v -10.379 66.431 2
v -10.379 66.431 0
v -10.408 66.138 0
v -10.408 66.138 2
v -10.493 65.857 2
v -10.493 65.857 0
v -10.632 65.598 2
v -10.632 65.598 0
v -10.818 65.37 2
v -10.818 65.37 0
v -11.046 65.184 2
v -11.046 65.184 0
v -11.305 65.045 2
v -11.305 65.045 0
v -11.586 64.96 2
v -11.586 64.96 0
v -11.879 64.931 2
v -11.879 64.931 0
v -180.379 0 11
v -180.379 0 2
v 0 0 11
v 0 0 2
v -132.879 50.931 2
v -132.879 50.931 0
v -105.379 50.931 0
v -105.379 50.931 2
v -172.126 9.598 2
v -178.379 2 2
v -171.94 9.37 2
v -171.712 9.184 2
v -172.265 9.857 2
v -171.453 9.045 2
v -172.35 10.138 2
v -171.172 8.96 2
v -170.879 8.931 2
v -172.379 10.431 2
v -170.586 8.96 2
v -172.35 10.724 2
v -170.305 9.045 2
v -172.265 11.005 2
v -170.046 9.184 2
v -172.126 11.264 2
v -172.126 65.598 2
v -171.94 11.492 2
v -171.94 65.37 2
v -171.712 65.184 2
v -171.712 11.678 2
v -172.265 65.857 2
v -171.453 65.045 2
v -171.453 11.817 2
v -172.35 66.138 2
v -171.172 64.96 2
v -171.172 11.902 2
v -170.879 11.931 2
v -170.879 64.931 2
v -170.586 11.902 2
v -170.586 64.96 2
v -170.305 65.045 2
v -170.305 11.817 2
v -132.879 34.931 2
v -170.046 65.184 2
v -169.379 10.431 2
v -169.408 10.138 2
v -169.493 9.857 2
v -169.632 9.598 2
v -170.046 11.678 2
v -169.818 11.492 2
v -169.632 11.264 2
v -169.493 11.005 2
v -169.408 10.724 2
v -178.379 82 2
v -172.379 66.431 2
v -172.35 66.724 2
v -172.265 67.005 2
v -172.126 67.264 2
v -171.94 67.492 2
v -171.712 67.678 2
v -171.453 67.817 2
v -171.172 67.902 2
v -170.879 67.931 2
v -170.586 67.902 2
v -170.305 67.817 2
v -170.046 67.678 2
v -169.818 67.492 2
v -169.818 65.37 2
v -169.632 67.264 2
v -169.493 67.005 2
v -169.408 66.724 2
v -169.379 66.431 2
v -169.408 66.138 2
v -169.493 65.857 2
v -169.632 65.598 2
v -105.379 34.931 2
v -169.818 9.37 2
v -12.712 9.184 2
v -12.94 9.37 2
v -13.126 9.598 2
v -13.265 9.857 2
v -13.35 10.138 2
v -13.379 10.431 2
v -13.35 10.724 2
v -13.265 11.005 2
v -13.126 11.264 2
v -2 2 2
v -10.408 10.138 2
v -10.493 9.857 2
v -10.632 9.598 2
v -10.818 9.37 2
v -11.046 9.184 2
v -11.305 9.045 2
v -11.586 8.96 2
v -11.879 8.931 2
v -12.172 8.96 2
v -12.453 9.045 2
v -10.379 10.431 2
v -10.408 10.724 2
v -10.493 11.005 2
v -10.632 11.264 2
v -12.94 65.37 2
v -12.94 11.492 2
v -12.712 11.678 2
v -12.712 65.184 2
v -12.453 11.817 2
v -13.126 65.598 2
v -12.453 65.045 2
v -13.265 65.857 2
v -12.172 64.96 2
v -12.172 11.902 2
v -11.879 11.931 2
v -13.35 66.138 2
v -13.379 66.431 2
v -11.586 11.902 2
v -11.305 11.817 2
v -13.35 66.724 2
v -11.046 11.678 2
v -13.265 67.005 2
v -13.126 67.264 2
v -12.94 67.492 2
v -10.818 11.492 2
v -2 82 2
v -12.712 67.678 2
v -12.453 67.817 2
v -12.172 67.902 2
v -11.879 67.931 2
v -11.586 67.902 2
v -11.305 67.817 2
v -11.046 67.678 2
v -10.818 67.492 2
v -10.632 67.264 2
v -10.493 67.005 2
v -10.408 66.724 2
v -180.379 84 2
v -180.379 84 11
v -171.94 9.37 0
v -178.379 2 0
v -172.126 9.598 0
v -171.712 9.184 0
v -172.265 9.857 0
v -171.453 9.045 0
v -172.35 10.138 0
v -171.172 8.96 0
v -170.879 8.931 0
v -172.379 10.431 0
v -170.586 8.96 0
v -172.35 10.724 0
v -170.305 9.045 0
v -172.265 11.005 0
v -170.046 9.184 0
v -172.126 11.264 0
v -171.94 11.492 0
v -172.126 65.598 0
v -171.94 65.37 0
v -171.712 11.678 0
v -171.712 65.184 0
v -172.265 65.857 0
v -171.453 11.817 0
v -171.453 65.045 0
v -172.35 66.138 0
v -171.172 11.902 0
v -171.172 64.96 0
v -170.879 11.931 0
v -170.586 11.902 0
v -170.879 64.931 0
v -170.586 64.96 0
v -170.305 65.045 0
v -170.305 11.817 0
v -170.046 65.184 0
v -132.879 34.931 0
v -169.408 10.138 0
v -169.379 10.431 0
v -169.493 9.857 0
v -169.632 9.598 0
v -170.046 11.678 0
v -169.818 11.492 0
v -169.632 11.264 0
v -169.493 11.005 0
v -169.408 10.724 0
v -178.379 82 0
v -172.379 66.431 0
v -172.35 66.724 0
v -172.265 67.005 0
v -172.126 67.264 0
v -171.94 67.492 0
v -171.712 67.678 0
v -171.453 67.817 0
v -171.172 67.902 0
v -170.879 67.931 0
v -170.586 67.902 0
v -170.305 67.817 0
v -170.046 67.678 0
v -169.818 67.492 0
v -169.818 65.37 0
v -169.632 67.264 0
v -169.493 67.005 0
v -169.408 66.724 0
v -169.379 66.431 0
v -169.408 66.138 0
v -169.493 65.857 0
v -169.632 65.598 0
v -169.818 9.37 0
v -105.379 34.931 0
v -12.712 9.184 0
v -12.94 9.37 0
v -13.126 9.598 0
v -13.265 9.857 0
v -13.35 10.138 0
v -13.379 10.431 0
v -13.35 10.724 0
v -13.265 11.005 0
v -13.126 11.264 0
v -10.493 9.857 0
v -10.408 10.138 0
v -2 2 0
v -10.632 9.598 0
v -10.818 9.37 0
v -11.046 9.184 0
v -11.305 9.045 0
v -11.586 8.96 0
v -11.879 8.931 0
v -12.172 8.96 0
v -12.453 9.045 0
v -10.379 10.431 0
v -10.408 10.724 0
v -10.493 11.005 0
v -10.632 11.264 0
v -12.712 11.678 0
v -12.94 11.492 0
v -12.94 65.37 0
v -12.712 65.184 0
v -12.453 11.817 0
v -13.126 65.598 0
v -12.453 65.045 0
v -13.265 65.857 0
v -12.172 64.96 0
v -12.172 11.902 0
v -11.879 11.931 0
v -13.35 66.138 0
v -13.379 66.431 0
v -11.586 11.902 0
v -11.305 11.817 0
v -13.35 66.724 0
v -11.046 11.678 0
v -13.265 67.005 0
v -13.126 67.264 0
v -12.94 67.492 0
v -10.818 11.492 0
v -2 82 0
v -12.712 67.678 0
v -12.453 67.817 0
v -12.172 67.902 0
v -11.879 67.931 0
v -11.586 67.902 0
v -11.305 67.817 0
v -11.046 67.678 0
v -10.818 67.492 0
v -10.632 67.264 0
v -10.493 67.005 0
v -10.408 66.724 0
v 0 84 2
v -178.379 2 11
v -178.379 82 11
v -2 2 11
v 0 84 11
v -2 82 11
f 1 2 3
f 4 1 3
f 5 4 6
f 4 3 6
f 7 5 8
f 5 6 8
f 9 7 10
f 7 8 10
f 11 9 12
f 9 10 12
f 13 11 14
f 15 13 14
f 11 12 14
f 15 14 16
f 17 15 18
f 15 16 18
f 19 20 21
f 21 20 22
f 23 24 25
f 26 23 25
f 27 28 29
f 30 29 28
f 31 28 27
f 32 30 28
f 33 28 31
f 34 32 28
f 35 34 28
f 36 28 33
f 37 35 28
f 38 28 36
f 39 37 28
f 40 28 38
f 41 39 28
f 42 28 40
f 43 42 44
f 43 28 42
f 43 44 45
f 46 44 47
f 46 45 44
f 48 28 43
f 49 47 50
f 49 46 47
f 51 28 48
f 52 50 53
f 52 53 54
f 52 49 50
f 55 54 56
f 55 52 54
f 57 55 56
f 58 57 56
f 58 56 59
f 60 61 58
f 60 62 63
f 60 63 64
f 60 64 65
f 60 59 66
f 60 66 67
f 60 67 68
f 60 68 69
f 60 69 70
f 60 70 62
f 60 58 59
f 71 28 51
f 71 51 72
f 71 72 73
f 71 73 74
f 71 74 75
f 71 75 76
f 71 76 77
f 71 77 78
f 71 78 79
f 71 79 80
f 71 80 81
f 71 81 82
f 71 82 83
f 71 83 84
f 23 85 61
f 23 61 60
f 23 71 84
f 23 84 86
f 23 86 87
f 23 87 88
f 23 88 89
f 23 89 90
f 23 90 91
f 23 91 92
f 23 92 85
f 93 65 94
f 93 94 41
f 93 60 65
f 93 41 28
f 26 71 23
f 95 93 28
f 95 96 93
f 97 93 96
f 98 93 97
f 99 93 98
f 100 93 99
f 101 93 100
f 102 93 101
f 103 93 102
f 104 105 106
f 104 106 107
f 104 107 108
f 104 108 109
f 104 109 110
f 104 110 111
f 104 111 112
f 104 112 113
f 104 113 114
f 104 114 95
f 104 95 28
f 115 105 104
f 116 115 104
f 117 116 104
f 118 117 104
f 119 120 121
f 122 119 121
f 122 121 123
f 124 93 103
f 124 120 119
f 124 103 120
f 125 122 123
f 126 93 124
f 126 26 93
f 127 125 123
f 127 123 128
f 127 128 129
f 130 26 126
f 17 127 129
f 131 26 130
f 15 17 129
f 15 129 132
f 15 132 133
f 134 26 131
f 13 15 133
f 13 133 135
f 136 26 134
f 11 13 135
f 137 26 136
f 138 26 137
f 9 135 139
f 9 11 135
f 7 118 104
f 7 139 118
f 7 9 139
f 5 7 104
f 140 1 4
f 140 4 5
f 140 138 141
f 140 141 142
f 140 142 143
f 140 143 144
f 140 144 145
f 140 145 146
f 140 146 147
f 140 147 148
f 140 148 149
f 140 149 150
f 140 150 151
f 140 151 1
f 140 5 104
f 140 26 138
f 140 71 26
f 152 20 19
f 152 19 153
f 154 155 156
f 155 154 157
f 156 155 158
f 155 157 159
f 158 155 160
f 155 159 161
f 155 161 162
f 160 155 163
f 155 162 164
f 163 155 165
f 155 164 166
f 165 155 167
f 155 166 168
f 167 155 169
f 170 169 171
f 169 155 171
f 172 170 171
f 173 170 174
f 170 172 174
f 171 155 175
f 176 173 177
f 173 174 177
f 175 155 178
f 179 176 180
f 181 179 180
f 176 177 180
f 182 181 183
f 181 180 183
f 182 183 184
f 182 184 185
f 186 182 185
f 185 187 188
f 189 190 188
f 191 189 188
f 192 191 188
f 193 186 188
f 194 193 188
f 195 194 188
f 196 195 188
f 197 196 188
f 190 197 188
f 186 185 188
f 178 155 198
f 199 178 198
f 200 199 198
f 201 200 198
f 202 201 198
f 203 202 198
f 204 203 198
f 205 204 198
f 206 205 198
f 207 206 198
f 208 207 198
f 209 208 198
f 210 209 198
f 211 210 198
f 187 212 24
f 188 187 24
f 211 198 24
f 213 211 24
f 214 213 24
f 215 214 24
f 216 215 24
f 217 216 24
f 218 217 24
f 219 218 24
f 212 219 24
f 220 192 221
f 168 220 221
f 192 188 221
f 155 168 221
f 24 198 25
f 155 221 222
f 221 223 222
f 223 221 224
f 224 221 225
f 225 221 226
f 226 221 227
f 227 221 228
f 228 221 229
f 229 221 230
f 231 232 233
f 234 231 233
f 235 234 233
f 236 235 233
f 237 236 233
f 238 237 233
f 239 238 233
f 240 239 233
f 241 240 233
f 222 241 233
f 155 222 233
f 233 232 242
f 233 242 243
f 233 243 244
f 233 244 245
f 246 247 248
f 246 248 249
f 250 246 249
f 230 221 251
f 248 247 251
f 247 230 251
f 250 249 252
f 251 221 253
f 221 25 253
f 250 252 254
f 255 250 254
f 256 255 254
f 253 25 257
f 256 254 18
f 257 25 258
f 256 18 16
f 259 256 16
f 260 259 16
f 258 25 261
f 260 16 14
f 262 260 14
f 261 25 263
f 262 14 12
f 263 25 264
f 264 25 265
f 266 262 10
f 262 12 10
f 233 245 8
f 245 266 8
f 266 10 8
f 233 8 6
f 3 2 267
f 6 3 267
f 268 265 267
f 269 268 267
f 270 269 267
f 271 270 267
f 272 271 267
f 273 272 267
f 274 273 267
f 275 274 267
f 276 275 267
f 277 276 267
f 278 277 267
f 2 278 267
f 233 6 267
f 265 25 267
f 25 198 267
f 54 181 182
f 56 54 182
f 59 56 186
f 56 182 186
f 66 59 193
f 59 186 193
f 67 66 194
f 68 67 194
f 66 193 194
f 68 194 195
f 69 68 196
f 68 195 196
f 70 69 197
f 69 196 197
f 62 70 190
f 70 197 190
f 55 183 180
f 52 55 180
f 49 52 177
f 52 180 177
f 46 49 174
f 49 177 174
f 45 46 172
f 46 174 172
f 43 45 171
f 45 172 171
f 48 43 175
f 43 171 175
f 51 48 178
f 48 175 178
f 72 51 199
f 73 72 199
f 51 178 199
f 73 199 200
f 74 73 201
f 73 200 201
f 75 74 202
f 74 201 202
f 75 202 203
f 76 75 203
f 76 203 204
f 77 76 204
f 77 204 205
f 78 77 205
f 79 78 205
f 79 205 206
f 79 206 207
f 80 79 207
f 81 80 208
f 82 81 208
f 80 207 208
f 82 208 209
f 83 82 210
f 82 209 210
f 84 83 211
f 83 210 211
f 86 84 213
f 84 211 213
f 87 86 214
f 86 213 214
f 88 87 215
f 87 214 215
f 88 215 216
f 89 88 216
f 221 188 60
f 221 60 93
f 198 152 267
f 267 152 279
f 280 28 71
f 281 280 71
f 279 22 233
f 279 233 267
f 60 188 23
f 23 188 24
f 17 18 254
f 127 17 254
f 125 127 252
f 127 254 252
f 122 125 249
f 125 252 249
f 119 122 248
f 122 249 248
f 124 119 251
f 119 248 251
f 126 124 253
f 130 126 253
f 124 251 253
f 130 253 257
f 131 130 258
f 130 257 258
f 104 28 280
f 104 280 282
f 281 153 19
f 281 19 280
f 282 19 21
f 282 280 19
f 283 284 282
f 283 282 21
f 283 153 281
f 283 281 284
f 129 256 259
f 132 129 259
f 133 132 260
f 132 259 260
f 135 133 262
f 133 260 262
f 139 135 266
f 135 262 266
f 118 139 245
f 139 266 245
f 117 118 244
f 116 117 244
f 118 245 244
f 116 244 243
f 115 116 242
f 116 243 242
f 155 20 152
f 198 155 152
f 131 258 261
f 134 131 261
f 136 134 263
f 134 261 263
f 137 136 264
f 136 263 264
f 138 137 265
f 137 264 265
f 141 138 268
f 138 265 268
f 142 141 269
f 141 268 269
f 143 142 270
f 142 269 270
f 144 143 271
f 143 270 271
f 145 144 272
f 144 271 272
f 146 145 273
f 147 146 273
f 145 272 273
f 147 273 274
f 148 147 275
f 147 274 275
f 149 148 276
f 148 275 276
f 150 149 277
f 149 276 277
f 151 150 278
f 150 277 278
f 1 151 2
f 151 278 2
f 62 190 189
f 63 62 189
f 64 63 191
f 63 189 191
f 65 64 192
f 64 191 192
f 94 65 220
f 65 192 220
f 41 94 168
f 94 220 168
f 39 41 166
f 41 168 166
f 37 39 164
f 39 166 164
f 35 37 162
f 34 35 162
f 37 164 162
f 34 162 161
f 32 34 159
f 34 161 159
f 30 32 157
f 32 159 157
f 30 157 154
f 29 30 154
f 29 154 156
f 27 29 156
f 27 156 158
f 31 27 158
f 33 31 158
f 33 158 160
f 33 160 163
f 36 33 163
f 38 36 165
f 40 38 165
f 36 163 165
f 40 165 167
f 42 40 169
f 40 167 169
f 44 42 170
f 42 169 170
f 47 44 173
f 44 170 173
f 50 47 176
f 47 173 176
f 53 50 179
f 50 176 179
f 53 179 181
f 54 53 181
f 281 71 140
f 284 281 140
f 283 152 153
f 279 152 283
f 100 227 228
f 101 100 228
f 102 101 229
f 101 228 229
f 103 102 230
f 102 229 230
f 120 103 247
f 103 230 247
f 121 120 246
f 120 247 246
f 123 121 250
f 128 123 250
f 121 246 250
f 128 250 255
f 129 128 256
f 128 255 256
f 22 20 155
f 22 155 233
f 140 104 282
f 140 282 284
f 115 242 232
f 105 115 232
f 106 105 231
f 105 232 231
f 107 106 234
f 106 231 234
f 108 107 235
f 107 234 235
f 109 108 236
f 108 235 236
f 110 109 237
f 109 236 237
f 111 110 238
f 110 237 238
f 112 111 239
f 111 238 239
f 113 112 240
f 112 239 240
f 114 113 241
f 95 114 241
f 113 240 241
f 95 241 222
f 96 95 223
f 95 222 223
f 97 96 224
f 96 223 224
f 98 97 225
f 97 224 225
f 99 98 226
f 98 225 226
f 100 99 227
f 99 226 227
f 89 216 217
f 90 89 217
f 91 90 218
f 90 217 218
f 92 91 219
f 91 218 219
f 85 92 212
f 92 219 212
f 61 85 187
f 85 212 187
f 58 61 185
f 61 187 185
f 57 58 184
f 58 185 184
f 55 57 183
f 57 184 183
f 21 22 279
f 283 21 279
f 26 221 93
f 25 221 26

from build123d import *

# Parameters (mm, degrees)
F0_W     = 180.379
F0_H     = 84
F0_W_2   = 176.379
F0_H_2   = 80
F1_DEPTH = 11
F0_W_3   = 164
F0_H_3   = 61
F0_W_4   = 27.5
F0_H_4   = 16
F2_DEPTH = 2
F3_SIZE  = 2


with BuildPart() as f1:
    # F0 (on Top) → F1 (new body)
    with BuildSketch(Plane.XY):
        with Locations((-90.1895, 42)):
            Rectangle(F0_W, F0_H)
        with Locations((-90.1895, 42)):
            Rectangle(F0_W_2, F0_H_2, mode=Mode.SUBTRACT)
    extrude(amount=F1_DEPTH)

    # F0 (on Top) → F2 (join)
    with BuildSketch(Plane.XY):
        with Locations((-90.1895, 42)):
            Rectangle(F0_W_2, F0_H_2)
        with Locations((-91.379, 38.431)):
            Rectangle(F0_W_3, F0_H_3, mode=Mode.SUBTRACT)
        with Locations((-91.379, 38.431)):
            Rectangle(F0_W_3, F0_H_3)
        with BuildLine():
            ThreePointArc((-170.879, 64.931), (-171.9396601718, 67.4916601718), (-169.379, 66.431))
            Line((-169.379, 66.431), (-13.379, 66.431))
            ThreePointArc((-13.379, 66.431), (-11.879, 67.931), (-10.379, 66.431))
            ThreePointArc((-10.379, 66.431), (-10.8183398282, 65.3703398282), (-11.879, 64.931))
            Line((-11.879, 64.931), (-11.879, 11.931))
            ThreePointArc((-11.879, 11.931), (-10.8183398282, 11.4916601718), (-10.379, 10.431))
            ThreePointArc((-10.379, 10.431), (-11.879, 8.931), (-13.379, 10.431))
            Line((-13.379, 10.431), (-169.379, 10.431))
            ThreePointArc((-169.379, 10.431), (-171.9396601718, 9.3703398282), (-170.879, 11.931))
            Line((-170.879, 11.931), (-170.879, 64.931))
        make_face(mode=Mode.SUBTRACT)
        with BuildLine():
            Line((-13.379, 66.431), (-169.379, 66.431))
            ThreePointArc((-169.379, 66.431), (-169.8183398282, 65.3703398282), (-170.879, 64.931))
            Line((-170.879, 64.931), (-170.879, 11.931))
            ThreePointArc((-170.879, 11.931), (-169.8183398282, 11.4916601718), (-169.379, 10.431))
            Line((-169.379, 10.431), (-13.379, 10.431))
            ThreePointArc((-13.379, 10.431), (-12.9396601718, 11.4916601718), (-11.879, 11.931))
            Line((-11.879, 11.931), (-11.879, 64.931))
            ThreePointArc((-11.879, 64.931), (-12.9396601718, 65.3703398282), (-13.379, 66.431))
        make_face()
        with Locations((-119.129, 42.931)):
            Rectangle(F0_W_4, F0_H_4, mode=Mode.SUBTRACT)
    extrude(amount=F2_DEPTH)

    # F3
    f3_edges = [f1.edges().sort_by_distance(p)[0] for p in [
        (0, 42, 0),
        (-90.1895, 84, 0),
        (-90.1895, 0, 0),
        (-180.379, 42, 0),
    ]]
    chamfer(f3_edges, length=F3_SIZE)


solid = f1.part
